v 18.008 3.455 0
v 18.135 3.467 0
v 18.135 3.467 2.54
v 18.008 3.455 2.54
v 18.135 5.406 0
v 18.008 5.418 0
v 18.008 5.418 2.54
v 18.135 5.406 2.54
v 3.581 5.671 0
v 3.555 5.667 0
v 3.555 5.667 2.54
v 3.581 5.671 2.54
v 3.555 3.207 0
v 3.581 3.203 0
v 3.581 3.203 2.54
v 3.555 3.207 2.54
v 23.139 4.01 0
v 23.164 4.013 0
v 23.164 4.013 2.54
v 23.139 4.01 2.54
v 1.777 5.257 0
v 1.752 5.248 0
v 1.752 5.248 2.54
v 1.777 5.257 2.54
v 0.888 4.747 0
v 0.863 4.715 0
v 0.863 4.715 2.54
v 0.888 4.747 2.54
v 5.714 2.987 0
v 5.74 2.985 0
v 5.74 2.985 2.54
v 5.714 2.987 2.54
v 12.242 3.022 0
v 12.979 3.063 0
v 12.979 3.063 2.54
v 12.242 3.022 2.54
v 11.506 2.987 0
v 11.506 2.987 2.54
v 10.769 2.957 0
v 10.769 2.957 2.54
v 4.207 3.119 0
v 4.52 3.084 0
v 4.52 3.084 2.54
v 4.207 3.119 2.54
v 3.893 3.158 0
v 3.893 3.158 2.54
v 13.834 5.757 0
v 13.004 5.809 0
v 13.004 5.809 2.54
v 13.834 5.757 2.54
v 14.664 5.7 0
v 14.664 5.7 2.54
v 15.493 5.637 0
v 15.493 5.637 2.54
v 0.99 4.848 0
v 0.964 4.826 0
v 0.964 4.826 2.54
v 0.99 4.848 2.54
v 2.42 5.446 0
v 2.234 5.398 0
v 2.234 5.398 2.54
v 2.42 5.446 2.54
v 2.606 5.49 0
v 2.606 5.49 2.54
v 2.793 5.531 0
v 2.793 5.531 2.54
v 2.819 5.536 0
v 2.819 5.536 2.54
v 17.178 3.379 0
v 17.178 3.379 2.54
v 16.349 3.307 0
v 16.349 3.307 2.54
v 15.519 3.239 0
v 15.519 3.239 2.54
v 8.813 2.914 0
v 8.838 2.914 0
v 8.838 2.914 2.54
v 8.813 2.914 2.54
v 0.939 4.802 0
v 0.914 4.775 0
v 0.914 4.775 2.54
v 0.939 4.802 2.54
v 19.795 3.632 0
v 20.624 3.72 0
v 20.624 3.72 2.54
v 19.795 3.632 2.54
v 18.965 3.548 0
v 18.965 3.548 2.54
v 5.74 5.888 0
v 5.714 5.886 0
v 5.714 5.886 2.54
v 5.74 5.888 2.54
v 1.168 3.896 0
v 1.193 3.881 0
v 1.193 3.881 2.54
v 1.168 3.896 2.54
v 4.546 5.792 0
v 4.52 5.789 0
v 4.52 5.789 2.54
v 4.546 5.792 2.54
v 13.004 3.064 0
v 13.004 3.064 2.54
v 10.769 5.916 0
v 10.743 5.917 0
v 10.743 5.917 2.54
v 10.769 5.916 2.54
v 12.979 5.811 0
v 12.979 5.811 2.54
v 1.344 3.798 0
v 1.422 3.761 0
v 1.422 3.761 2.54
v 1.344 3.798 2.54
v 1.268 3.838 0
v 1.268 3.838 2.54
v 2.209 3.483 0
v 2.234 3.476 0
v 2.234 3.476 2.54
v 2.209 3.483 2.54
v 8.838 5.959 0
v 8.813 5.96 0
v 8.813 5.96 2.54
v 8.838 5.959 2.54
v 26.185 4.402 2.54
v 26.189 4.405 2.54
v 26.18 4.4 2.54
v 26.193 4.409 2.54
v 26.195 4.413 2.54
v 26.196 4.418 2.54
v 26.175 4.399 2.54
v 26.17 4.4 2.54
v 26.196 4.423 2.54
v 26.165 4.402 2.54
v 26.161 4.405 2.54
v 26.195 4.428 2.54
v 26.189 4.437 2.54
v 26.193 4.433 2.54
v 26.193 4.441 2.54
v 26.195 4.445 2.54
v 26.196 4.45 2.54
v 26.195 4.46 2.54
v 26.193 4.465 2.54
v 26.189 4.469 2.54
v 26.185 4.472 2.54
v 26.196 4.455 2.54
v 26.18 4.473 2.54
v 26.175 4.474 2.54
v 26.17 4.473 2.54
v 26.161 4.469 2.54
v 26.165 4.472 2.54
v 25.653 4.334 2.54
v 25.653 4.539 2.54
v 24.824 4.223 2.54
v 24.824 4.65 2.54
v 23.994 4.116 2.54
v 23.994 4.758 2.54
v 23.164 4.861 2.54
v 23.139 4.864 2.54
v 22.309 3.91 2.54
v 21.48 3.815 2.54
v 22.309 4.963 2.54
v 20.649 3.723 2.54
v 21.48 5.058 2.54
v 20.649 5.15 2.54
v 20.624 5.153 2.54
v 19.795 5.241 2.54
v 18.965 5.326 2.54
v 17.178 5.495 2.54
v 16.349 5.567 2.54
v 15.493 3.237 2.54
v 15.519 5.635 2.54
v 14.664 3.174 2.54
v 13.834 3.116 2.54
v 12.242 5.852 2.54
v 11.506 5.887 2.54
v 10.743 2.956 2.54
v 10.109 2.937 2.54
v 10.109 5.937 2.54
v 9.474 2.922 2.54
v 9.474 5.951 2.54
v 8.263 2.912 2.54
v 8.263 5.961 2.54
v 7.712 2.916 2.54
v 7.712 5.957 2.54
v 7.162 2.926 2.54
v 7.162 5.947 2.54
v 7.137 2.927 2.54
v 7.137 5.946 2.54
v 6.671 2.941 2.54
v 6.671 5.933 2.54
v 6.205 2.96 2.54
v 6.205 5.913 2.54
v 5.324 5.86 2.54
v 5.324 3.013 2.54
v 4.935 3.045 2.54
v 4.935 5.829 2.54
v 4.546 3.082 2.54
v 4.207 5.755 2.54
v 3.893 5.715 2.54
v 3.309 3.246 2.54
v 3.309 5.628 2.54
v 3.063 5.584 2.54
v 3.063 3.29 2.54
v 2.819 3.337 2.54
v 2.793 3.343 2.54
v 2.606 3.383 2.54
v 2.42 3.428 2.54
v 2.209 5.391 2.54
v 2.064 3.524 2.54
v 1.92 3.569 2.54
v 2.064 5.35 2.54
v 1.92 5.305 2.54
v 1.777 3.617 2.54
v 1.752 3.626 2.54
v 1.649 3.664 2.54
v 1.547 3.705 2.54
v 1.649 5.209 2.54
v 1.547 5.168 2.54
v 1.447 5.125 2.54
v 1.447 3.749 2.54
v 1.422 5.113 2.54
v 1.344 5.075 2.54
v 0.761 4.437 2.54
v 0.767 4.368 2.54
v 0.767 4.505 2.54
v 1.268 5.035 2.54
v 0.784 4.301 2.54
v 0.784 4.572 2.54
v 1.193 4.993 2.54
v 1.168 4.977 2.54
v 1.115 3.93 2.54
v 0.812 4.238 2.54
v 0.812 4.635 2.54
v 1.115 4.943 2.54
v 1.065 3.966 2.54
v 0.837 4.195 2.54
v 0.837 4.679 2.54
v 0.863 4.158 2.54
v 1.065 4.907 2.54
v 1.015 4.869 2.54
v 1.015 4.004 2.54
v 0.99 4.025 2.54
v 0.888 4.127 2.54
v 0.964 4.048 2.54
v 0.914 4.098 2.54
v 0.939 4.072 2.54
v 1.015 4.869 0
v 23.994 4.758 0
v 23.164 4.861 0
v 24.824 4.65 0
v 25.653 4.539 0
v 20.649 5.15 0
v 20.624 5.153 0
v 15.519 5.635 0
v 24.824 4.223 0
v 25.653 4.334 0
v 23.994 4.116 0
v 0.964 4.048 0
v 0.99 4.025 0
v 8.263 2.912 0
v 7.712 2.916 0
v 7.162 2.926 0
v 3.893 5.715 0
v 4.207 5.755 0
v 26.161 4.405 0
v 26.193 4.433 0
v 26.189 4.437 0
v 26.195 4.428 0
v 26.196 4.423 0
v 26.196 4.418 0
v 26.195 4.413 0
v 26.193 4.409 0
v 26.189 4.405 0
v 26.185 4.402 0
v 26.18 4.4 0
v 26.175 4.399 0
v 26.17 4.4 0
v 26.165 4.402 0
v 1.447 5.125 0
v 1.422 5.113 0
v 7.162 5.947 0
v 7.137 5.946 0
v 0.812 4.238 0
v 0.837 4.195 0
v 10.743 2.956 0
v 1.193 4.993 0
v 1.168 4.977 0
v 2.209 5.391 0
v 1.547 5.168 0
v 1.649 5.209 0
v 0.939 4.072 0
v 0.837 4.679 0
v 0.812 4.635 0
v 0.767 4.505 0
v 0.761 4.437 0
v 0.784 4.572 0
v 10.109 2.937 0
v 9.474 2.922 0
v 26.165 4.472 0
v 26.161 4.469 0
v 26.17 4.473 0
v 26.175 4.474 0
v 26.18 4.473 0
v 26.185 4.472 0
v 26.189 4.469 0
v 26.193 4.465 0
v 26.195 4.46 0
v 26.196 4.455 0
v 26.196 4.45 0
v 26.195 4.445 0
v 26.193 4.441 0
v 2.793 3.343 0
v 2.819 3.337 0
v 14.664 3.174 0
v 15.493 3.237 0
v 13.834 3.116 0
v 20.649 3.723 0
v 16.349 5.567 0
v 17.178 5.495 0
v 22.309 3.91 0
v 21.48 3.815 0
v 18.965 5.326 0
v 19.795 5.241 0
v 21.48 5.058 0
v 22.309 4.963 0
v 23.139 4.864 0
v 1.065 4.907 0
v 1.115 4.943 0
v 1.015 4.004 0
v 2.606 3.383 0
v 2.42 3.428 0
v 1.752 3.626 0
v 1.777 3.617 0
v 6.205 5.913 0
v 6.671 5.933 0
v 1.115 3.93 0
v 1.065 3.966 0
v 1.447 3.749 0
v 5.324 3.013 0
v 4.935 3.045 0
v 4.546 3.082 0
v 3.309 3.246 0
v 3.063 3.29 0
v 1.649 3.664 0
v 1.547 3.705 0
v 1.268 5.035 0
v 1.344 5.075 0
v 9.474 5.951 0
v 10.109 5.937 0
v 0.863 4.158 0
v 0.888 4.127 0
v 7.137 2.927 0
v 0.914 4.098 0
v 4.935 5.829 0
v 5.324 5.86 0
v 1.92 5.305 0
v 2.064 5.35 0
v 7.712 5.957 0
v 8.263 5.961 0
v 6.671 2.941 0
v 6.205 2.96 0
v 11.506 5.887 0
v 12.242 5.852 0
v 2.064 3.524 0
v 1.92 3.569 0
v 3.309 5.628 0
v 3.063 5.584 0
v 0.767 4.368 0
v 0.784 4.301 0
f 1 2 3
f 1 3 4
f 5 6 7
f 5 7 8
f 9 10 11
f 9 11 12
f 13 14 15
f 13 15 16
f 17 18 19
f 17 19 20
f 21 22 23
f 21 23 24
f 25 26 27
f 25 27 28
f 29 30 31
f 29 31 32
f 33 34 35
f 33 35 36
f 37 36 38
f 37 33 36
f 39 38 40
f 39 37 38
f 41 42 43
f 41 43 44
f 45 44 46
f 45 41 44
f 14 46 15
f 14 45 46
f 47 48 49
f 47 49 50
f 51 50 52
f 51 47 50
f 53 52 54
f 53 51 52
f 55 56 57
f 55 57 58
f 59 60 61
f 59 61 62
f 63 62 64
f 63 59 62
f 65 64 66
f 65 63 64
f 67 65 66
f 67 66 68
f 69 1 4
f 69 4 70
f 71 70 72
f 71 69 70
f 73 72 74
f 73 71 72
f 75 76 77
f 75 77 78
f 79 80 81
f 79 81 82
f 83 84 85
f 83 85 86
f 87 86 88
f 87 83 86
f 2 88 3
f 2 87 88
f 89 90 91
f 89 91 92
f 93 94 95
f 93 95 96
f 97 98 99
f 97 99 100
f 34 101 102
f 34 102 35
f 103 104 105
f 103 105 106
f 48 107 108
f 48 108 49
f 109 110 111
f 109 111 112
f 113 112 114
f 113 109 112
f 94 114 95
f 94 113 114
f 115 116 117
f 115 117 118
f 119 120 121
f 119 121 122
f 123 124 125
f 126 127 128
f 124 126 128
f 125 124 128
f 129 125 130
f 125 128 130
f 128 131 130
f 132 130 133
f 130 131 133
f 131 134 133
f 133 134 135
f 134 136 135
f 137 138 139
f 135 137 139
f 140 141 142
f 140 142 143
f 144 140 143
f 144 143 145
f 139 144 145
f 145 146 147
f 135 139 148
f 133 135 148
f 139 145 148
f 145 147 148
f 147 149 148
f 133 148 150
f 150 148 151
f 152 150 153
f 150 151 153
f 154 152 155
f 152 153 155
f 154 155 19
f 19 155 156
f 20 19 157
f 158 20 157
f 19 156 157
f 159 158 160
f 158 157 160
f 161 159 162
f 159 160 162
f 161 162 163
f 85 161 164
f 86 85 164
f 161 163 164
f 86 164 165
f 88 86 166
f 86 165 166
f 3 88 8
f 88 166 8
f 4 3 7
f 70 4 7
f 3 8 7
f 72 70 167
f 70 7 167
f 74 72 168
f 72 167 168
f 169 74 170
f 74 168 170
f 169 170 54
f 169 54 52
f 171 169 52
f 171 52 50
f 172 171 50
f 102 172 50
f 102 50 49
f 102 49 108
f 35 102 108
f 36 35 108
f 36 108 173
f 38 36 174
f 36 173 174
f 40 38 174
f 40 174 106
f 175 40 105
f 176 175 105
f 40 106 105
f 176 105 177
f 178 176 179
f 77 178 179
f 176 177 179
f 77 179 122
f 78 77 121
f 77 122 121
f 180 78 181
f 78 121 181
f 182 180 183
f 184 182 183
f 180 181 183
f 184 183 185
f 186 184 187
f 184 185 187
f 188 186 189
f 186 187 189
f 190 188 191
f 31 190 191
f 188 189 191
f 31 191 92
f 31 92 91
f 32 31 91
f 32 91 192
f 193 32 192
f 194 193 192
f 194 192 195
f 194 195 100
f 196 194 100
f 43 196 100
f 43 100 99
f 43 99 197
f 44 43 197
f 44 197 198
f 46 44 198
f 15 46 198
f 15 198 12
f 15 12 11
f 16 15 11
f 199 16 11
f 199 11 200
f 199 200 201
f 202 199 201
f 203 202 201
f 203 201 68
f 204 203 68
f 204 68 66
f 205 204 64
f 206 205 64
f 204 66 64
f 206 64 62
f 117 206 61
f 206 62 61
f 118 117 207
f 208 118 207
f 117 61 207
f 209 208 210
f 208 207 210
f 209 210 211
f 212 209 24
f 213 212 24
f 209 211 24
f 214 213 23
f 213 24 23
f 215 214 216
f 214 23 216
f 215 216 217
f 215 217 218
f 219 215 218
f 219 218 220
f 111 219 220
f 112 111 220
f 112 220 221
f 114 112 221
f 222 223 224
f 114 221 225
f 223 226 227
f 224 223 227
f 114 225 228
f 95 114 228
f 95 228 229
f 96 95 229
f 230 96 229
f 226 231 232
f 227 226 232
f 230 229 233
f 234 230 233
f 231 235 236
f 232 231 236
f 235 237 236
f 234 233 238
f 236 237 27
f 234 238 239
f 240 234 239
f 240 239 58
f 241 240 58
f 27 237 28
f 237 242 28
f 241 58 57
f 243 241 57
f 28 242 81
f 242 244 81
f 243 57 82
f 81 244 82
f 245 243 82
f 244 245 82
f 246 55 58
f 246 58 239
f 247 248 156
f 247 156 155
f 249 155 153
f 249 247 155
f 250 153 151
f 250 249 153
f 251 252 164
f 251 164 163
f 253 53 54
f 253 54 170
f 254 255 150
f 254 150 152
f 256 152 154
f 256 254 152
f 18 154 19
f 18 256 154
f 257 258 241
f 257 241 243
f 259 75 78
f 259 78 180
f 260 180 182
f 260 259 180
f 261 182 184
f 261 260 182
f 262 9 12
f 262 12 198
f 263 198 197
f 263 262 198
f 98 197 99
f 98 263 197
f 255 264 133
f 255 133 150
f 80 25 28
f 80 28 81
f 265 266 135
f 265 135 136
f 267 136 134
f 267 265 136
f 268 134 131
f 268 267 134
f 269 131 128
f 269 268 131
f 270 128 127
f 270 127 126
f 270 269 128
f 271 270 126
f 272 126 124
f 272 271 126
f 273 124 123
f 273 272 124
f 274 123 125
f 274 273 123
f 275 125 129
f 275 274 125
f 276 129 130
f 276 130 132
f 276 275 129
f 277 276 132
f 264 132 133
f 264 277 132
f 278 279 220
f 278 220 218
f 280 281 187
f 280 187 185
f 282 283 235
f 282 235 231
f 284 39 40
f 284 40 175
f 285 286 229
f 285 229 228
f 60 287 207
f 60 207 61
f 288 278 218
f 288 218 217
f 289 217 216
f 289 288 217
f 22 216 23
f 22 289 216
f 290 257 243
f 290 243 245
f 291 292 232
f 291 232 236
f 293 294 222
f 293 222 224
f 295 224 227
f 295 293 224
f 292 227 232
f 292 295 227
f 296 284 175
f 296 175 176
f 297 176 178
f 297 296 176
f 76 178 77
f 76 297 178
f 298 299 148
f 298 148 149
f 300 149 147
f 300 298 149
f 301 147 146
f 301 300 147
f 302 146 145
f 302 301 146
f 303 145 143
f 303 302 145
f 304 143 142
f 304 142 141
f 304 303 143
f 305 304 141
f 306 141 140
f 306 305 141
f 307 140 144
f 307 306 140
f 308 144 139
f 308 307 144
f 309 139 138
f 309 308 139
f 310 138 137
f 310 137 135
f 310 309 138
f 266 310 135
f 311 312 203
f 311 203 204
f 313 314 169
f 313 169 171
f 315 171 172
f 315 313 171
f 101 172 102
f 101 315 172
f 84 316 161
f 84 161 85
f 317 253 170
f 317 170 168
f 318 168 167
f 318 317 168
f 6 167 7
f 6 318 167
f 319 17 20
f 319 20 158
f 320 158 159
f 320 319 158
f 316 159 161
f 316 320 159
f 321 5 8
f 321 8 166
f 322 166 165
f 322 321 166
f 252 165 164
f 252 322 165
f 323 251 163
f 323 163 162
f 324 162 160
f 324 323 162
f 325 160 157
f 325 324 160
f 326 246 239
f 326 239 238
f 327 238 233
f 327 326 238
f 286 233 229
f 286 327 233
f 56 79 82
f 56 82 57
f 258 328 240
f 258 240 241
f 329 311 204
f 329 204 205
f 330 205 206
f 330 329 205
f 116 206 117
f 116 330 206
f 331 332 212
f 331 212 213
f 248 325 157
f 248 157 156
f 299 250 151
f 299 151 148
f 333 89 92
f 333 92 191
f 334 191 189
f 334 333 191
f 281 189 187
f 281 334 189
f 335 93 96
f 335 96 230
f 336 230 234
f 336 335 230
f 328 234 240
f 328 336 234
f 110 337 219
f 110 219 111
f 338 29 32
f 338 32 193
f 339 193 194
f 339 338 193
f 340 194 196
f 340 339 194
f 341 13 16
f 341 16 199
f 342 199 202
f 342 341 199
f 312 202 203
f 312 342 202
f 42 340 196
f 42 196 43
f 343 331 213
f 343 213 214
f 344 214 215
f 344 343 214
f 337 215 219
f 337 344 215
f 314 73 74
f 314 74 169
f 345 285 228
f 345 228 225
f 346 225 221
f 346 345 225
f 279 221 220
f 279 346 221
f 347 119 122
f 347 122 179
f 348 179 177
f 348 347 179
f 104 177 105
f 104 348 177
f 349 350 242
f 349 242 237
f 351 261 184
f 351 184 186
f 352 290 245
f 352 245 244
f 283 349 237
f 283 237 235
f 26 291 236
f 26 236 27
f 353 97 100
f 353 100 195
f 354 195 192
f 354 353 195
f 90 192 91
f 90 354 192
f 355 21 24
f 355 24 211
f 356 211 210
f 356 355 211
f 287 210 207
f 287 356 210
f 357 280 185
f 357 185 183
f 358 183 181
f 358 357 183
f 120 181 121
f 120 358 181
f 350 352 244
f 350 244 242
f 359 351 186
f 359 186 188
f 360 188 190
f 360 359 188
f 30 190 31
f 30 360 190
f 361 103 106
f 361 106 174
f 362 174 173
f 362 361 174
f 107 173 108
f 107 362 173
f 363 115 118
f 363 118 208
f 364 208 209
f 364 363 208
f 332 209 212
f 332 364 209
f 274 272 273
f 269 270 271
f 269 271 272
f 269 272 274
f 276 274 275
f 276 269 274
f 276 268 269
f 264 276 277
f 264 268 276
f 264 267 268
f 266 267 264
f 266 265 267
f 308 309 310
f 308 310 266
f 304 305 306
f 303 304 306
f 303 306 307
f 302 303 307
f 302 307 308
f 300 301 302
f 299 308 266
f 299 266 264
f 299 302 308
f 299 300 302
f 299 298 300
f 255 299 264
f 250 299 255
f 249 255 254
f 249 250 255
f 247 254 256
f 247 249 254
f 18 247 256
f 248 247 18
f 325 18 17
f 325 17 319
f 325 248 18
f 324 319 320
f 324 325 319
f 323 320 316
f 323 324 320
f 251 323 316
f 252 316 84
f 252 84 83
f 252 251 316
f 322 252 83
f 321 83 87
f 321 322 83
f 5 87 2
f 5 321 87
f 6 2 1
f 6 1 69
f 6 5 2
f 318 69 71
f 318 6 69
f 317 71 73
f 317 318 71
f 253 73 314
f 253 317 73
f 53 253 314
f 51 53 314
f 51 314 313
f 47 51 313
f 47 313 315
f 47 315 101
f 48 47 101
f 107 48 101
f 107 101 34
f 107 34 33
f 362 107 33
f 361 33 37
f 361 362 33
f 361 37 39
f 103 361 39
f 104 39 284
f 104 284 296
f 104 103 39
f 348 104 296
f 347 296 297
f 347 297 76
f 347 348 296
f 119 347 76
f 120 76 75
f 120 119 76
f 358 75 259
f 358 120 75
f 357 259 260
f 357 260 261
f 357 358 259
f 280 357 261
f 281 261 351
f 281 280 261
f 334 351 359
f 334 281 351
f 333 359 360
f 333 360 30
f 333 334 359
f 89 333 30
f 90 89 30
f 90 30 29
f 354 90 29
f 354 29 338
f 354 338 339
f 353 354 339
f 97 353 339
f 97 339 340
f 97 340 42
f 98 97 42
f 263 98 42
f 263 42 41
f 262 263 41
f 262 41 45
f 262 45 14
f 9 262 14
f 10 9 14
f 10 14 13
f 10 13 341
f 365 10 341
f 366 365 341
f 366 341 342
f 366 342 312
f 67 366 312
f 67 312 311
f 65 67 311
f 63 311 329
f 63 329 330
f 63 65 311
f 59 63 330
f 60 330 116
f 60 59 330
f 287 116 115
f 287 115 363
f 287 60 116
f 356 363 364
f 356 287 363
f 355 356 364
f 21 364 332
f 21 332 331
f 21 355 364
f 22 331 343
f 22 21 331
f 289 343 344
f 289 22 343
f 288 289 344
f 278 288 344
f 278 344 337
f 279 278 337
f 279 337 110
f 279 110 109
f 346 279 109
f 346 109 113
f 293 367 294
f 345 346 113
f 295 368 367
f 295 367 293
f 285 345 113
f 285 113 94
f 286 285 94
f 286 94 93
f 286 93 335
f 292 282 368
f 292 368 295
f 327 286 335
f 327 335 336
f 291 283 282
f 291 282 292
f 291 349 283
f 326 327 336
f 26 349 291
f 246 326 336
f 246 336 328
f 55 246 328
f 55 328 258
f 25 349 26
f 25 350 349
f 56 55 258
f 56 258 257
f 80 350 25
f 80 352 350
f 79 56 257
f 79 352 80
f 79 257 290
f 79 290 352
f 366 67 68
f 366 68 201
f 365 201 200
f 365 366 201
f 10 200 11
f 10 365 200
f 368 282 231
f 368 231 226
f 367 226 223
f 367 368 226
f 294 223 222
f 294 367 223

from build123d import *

# Parameters (mm, degrees)
BOSS_EXTRUDE1_DEPTH = 2.54


with BuildPart() as part:
    # Model → Boss-Extrude1 (new body)
    with BuildSketch(Plane.XY):
        with BuildLine():
            Line((0.837402515, 4.194701871), (0.812002515, 4.238232391))
            ThreePointArc((0.812002515, 4.238232391), (0.774103936, 4.334279035), (0.761202515, 4.436723231))
            ThreePointArc((0.761202515, 4.436723231), (0.774103936, 4.539167428), (0.812002515, 4.635214071))
            Line((0.812002515, 4.635214071), (0.837402515, 4.678744591))
            Line((0.837402515, 4.678744591), (0.862802515, 4.715127551))
            Line((0.862802515, 4.715127551), (0.888202515, 4.746935971))
            Line((0.888202515, 4.746935971), (0.913602515, 4.775495731))
            Line((0.913602515, 4.775495731), (0.939002515, 4.801589151))
            Line((0.939002515, 4.801589151), (0.964402515, 4.825726771))
            Line((0.964402515, 4.825726771), (0.989802515, 4.848266731))
            Line((0.989802515, 4.848266731), (1.015202515, 4.869465571))
            ThreePointArc((1.015202515, 4.869465571), (1.089772897, 4.925535764), (1.167602515, 4.976986311))
            Line((1.167602515, 4.976986311), (1.193002515, 4.992508251))
            ThreePointArc((1.193002515, 4.992508251), (1.305754767, 5.055617229), (1.421602515, 5.112845831))
            Line((1.421602515, 5.112845831), (1.447002515, 5.124547611))
            ThreePointArc((1.447002515, 5.124547611), (1.598149319, 5.189132356), (1.751802515, 5.247503931))
            Line((1.751802515, 5.247503931), (1.777202515, 5.256564111))
            ThreePointArc((1.777202515, 5.256564111), (1.991913899, 5.32756087), (2.209002515, 5.390917411))
            Line((2.209002515, 5.390917411), (2.234402515, 5.397856691))
            ThreePointArc((2.234402515, 5.397856691), (2.512823075, 5.468426298), (2.793202515, 5.530759651))
            Line((2.793202515, 5.530759651), (2.818602515, 5.536032691))
            ThreePointArc((2.818602515, 5.536032691), (3.18604982, 5.606262809), (3.555202515, 5.666893491))
            Line((3.555202515, 5.666893491), (3.580602515, 5.670744131))
            ThreePointArc((3.580602515, 5.670744131), (4.049820252, 5.735370933), (4.520402515, 5.789169091))
            Line((4.520402515, 5.789169091), (4.545802515, 5.791795451))
            ThreePointArc((4.545802515, 5.791795451), (5.129518216, 5.845119064), (5.714202515, 5.886491731))
            Line((5.714202515, 5.886491731), (5.739602515, 5.888043671))
            ThreePointArc((5.739602515, 5.888043671), (6.437840457, 5.923508303), (7.136602515, 5.946433191))
            Line((7.136602515, 5.946433191), (7.162002515, 5.947052951))
            ThreePointArc((7.162002515, 5.947052951), (7.987453434, 5.959786425), (8.813002515, 5.959509111))
            Line((8.813002515, 5.959509111), (8.838402515, 5.959313531))
            ThreePointArc((8.838402515, 5.959313531), (9.791045496, 5.944671622), (10.743402515, 5.917119051))
            Line((10.743402515, 5.917119051), (10.768802515, 5.916224971))
            ThreePointArc((10.768802515, 5.916224971), (11.874009843, 5.869976991), (12.978602515, 5.810840371))
            Line((12.978602515, 5.810840371), (13.004002515, 5.809341771))
            ThreePointArc((13.004002515, 5.809341771), (14.249024434, 5.729100435), (15.493202515, 5.636692891))
            Line((15.493202515, 5.636692891), (15.518602515, 5.634691371))
            ThreePointArc((15.518602515, 5.634691371), (16.763614783, 5.531321058), (18.007802486, 5.418458634))
            Line((18.007802486, 5.418458634), (18.134802481, 5.406436814))
            ThreePointArc((18.134802481, 5.406436814), (19.379819615, 5.283861478), (20.624002515, 5.153089591))
            Line((20.624002515, 5.153089591), (20.649402515, 5.150333691))
            ThreePointArc((20.649402515, 5.150333691), (21.894471689, 5.011181274), (23.138602515, 4.863875031))
            Line((23.138602515, 4.863875031), (23.164002515, 4.860781311))
            ThreePointArc((23.164002515, 4.860781311), (24.409193854, 4.704533833), (25.653202485, 4.539133495))
            Line((25.653202485, 4.539133495), (26.161202515, 4.468727231))
            ThreePointArc((26.161202515, 4.468727231), (26.191266445, 4.466787161), (26.189326375, 4.436723231))
            ThreePointArc((26.189326375, 4.436723231), (26.191266445, 4.406659301), (26.161202515, 4.404719231))
            Line((26.161202515, 4.404719231), (25.653202485, 4.334312967))
            ThreePointArc((25.653202485, 4.334312967), (24.409193854, 4.168912629), (23.164002515, 4.012665151))
            Line((23.164002515, 4.012665151), (23.138602515, 4.009571431))
            ThreePointArc((23.138602515, 4.009571431), (21.894471689, 3.862265188), (20.649402515, 3.723112771))
            Line((20.649402515, 3.723112771), (20.624002515, 3.720356871))
            ThreePointArc((20.624002515, 3.720356871), (19.379819615, 3.589584984), (18.134802481, 3.467009648))
            Line((18.134802481, 3.467009648), (18.007802486, 3.454987828))
            ThreePointArc((18.007802486, 3.454987828), (16.763614783, 3.342125404), (15.518602515, 3.238755091))
            Line((15.518602515, 3.238755091), (15.493202515, 3.236753571))
            ThreePointArc((15.493202515, 3.236753571), (14.249024434, 3.144346027), (13.004002515, 3.064104691))
            Line((13.004002515, 3.064104691), (12.978602515, 3.062606091))
            ThreePointArc((12.978602515, 3.062606091), (11.874009843, 3.003469471), (10.768802515, 2.957221491))
            Line((10.768802515, 2.957221491), (10.743402515, 2.956327411))
            ThreePointArc((10.743402515, 2.956327411), (9.791045496, 2.92877484), (8.838402515, 2.914132931))
            Line((8.838402515, 2.914132931), (8.813002515, 2.913937351))
            ThreePointArc((8.813002515, 2.913937351), (7.987453434, 2.913660037), (7.162002515, 2.926393511))
            Line((7.162002515, 2.926393511), (7.136602515, 2.927013271))
            ThreePointArc((7.136602515, 2.927013271), (6.437840457, 2.949938159), (5.739602515, 2.985402791))
            Line((5.739602515, 2.985402791), (5.714202515, 2.986954731))
            ThreePointArc((5.714202515, 2.986954731), (5.129518216, 3.028327398), (4.545802515, 3.081651011))
            Line((4.545802515, 3.081651011), (4.520402515, 3.084277371))
            ThreePointArc((4.520402515, 3.084277371), (4.049820252, 3.138075529), (3.580602515, 3.202702331))
            Line((3.580602515, 3.202702331), (3.555202515, 3.206552971))
            ThreePointArc((3.555202515, 3.206552971), (3.18604982, 3.267183653), (2.818602515, 3.337413771))
            Line((2.818602515, 3.337413771), (2.793202515, 3.342686811))
            ThreePointArc((2.793202515, 3.342686811), (2.512823075, 3.405020164), (2.234402515, 3.475589771))
            Line((2.234402515, 3.475589771), (2.209002515, 3.482529051))
            ThreePointArc((2.209002515, 3.482529051), (1.991913899, 3.545885592), (1.777202515, 3.616882351))
            Line((1.777202515, 3.616882351), (1.751802515, 3.625942531))
            ThreePointArc((1.751802515, 3.625942531), (1.598149319, 3.684314106), (1.447002515, 3.748898851))
            Line((1.447002515, 3.748898851), (1.421602515, 3.760600631))
            ThreePointArc((1.421602515, 3.760600631), (1.305754767, 3.817829233), (1.193002515, 3.880938211))
            Line((1.193002515, 3.880938211), (1.167602515, 3.896460151))
            ThreePointArc((1.167602515, 3.896460151), (1.089772897, 3.947910699), (1.015202515, 4.003980891))
            Line((1.015202515, 4.003980891), (0.989802515, 4.025179731))
            Line((0.989802515, 4.025179731), (0.964402515, 4.047719691))
            Line((0.964402515, 4.047719691), (0.939002515, 4.071857311))
            Line((0.939002515, 4.071857311), (0.913602515, 4.097950731))
            Line((0.913602515, 4.097950731), (0.888202515, 4.126510491))
            Line((0.888202515, 4.126510491), (0.862802515, 4.158318911))
            Line((0.862802515, 4.158318911), (0.837402515, 4.194701871))
        make_face()
    extrude(amount=BOSS_EXTRUDE1_DEPTH)


solid = part.part
